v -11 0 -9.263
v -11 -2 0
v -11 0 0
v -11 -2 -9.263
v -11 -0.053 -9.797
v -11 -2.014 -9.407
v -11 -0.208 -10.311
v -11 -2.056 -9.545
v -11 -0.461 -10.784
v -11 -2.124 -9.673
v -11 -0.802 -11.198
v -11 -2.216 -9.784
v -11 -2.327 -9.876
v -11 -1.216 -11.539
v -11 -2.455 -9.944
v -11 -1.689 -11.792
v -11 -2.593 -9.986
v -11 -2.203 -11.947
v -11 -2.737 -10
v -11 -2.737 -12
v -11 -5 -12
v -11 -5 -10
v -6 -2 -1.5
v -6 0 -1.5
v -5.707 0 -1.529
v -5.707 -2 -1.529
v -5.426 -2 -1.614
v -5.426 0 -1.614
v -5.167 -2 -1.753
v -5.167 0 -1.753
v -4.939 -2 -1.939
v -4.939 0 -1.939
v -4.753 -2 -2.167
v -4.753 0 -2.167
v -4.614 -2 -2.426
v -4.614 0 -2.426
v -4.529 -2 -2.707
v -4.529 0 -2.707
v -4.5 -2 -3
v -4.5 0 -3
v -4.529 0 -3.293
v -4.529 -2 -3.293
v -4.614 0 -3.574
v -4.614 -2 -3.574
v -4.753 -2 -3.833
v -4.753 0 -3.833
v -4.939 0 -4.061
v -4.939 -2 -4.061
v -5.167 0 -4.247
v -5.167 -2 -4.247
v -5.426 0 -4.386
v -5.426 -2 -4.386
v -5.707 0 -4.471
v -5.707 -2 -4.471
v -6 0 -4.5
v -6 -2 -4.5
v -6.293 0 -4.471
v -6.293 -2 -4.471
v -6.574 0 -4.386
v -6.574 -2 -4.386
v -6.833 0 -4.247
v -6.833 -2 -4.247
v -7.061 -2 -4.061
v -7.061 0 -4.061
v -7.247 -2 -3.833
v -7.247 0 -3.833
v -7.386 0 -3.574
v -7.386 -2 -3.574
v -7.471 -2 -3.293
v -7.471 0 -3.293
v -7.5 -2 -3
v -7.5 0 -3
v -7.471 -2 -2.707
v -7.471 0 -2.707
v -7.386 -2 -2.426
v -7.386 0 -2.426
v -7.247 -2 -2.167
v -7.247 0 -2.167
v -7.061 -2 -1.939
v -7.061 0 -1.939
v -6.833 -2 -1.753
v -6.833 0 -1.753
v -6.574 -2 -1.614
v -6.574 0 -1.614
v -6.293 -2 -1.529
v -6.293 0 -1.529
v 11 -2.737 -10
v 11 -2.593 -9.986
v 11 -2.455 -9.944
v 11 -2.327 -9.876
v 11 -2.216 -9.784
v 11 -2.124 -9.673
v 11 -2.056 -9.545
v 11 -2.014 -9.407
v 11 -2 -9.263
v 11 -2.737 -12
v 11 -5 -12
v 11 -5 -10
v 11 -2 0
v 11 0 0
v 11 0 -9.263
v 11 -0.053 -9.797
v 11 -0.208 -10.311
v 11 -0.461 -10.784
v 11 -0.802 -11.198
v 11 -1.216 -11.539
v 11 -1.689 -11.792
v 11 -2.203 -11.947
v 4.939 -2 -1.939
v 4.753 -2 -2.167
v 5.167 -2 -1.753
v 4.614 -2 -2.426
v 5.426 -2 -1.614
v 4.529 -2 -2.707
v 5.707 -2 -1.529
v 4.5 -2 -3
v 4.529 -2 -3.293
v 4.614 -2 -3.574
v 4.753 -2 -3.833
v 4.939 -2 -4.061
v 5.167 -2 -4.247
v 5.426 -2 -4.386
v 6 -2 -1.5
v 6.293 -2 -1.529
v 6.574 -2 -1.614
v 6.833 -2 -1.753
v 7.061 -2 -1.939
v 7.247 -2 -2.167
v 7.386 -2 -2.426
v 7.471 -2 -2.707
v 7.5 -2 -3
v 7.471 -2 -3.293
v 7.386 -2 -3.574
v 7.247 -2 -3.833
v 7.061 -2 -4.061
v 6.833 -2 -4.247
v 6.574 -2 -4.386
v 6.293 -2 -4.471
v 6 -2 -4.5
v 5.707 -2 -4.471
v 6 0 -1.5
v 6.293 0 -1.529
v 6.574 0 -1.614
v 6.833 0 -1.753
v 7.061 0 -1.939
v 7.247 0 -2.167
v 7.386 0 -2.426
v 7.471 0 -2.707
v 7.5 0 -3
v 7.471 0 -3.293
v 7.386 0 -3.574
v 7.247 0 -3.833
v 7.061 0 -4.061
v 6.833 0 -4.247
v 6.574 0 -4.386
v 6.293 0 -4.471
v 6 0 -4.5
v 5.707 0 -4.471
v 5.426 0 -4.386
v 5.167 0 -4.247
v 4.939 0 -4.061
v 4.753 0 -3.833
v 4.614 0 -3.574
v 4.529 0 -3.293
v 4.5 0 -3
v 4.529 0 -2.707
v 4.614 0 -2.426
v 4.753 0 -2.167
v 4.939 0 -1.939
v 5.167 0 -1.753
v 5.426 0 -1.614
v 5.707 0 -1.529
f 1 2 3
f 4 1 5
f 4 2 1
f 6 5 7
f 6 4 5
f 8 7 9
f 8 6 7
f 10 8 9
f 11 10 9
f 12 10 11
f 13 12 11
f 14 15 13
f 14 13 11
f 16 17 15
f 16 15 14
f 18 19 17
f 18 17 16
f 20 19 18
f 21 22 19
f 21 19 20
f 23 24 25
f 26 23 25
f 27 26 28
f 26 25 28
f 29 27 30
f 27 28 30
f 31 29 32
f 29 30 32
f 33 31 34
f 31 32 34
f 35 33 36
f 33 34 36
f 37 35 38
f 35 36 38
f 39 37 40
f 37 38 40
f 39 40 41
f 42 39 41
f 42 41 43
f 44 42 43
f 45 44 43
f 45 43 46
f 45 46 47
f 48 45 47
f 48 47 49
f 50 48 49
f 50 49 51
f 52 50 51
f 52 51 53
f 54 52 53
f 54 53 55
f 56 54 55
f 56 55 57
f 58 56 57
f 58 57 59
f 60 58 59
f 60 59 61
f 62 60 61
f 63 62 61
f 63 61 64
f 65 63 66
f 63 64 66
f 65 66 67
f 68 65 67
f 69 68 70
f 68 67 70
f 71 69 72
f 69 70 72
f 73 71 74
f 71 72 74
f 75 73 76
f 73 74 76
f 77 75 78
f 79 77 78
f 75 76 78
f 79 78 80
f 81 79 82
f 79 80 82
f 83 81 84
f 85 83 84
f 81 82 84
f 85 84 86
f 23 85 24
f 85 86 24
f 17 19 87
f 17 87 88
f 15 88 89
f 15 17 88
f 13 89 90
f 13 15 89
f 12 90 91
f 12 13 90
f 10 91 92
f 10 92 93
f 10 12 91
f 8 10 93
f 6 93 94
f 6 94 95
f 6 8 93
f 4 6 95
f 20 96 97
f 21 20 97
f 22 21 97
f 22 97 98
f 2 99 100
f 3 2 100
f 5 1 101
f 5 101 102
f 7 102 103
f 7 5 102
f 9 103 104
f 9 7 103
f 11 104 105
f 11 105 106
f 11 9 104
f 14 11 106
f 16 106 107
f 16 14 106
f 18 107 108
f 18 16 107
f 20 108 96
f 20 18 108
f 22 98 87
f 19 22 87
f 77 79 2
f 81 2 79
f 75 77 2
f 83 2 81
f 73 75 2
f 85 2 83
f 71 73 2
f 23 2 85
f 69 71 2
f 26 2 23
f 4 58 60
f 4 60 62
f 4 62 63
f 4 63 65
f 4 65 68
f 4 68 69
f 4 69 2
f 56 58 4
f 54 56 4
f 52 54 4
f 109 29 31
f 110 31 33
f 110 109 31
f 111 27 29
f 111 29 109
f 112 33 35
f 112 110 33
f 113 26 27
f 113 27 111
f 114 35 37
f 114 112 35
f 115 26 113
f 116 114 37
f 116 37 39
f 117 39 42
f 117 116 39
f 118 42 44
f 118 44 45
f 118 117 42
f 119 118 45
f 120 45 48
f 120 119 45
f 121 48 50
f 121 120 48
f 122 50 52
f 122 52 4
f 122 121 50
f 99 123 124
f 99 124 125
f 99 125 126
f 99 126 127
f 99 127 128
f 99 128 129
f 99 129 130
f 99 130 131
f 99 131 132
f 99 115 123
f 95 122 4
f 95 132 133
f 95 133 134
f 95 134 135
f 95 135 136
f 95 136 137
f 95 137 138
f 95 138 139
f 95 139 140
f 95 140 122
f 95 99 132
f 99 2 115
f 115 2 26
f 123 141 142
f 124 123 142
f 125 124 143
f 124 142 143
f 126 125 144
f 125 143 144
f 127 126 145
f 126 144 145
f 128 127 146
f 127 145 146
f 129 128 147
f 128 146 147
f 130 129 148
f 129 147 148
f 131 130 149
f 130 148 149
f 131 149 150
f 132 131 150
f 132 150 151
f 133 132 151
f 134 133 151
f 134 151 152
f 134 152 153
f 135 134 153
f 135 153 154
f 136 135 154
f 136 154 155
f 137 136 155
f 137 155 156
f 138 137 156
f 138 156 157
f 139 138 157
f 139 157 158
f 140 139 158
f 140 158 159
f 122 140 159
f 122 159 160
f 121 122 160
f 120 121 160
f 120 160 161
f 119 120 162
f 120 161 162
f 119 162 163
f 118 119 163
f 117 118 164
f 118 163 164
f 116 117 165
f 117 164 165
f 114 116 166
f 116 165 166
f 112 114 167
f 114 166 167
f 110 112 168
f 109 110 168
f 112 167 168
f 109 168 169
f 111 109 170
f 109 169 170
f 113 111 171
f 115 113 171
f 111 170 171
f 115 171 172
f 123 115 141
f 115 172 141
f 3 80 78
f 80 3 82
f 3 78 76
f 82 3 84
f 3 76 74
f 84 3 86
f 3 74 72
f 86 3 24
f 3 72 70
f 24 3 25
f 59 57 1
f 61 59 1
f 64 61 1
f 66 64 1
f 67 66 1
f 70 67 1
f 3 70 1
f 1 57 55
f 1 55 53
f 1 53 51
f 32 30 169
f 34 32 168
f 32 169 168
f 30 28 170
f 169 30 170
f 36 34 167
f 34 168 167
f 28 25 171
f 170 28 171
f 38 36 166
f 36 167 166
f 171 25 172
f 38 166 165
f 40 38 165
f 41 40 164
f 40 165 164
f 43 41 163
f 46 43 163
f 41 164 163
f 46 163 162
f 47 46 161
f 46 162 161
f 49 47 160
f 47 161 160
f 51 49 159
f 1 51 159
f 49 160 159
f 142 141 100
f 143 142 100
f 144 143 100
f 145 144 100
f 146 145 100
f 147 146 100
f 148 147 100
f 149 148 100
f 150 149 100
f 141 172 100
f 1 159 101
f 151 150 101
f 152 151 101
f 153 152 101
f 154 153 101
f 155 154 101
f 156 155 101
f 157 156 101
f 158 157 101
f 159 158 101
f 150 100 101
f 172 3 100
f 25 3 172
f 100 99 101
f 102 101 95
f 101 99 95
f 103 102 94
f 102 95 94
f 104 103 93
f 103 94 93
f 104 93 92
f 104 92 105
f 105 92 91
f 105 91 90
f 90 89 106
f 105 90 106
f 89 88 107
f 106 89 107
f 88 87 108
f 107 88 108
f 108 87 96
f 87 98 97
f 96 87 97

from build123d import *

# Parameters (mm, degrees)
SKETCH1_W                    = 12
SKETCH1_H                    = 2
BASE_FLANGE1_DEPTH           = 11
SKETCH2_R                    = 1.5
CUT_EXTRUDE1_DEPTH           = 10
EDGE_FLANGE1_STRIP_W         = 9.4732
EDGE_FLANGE1_STRIP_H         = 2
EDGE_FLANGE1_STRIP_CUT_DEPTH = 22
EDGE_FLANGE1_DEPTH           = 22


# Sheet-metal steps are written as plain solids
with BuildPart() as part:
    # Sketch1 → Base-Flange1 (new, symmetric)
    with BuildSketch(Plane(origin=(0, 0, 0), x_dir=(0, 0, -1), z_dir=(1, 0, 0))):
        with Locations((6, -1)):
            Rectangle(SKETCH1_W, SKETCH1_H)
    extrude(amount=BASE_FLANGE1_DEPTH, both=True)

    # Sketch2 → Cut-Extrude1 (cut)
    with BuildSketch(Plane(origin=(0, 0, 0), x_dir=(1, 0, 0), z_dir=(0, 1, 0))):
        with Locations(Location((-6, 3, 0), (0, 0, 270))):
            Circle(SKETCH2_R)
        with Locations(Location((6, 3, 0), (0, 0, 270))):
            Circle(SKETCH2_R)
    extrude(amount=-CUT_EXTRUDE1_DEPTH, mode=Mode.SUBTRACT)

    # Edge-Flange1 strip (across the edge) → Edge-Flange1 strip cut (cut)
    with BuildSketch(Plane(origin=(-11, -2, -12), x_dir=(0, 0, 1), z_dir=(1, 0, 0))):
        with Locations((-2, -1)):
            Rectangle(EDGE_FLANGE1_STRIP_W, EDGE_FLANGE1_STRIP_H)
    extrude(amount=EDGE_FLANGE1_STRIP_CUT_DEPTH, mode=Mode.SUBTRACT)

    # Edge-Flange1 section (across the edge) → Edge-Flange1 (add)
    with BuildSketch(Plane(origin=(-11, -2, -12), x_dir=(0, 0, 1), z_dir=(1, 0, 0))):
        with BuildLine():
            Line((0, 0.7366), (0, 3))
            Line((0, 3), (2, 3))
            Line((2, 3), (2, 0.7366))
            ThreePointArc((2, 0.7366), (2.215745145, 0.215745145), (2.7366, 0))
            Line((2.7366, 0), (2.7366, -2))
            ThreePointArc((2.7366, -2), (0.801531583, -1.198468417), (0, 0.7366))
        make_face()
    extrude(amount=EDGE_FLANGE1_DEPTH)


solid = part.part
